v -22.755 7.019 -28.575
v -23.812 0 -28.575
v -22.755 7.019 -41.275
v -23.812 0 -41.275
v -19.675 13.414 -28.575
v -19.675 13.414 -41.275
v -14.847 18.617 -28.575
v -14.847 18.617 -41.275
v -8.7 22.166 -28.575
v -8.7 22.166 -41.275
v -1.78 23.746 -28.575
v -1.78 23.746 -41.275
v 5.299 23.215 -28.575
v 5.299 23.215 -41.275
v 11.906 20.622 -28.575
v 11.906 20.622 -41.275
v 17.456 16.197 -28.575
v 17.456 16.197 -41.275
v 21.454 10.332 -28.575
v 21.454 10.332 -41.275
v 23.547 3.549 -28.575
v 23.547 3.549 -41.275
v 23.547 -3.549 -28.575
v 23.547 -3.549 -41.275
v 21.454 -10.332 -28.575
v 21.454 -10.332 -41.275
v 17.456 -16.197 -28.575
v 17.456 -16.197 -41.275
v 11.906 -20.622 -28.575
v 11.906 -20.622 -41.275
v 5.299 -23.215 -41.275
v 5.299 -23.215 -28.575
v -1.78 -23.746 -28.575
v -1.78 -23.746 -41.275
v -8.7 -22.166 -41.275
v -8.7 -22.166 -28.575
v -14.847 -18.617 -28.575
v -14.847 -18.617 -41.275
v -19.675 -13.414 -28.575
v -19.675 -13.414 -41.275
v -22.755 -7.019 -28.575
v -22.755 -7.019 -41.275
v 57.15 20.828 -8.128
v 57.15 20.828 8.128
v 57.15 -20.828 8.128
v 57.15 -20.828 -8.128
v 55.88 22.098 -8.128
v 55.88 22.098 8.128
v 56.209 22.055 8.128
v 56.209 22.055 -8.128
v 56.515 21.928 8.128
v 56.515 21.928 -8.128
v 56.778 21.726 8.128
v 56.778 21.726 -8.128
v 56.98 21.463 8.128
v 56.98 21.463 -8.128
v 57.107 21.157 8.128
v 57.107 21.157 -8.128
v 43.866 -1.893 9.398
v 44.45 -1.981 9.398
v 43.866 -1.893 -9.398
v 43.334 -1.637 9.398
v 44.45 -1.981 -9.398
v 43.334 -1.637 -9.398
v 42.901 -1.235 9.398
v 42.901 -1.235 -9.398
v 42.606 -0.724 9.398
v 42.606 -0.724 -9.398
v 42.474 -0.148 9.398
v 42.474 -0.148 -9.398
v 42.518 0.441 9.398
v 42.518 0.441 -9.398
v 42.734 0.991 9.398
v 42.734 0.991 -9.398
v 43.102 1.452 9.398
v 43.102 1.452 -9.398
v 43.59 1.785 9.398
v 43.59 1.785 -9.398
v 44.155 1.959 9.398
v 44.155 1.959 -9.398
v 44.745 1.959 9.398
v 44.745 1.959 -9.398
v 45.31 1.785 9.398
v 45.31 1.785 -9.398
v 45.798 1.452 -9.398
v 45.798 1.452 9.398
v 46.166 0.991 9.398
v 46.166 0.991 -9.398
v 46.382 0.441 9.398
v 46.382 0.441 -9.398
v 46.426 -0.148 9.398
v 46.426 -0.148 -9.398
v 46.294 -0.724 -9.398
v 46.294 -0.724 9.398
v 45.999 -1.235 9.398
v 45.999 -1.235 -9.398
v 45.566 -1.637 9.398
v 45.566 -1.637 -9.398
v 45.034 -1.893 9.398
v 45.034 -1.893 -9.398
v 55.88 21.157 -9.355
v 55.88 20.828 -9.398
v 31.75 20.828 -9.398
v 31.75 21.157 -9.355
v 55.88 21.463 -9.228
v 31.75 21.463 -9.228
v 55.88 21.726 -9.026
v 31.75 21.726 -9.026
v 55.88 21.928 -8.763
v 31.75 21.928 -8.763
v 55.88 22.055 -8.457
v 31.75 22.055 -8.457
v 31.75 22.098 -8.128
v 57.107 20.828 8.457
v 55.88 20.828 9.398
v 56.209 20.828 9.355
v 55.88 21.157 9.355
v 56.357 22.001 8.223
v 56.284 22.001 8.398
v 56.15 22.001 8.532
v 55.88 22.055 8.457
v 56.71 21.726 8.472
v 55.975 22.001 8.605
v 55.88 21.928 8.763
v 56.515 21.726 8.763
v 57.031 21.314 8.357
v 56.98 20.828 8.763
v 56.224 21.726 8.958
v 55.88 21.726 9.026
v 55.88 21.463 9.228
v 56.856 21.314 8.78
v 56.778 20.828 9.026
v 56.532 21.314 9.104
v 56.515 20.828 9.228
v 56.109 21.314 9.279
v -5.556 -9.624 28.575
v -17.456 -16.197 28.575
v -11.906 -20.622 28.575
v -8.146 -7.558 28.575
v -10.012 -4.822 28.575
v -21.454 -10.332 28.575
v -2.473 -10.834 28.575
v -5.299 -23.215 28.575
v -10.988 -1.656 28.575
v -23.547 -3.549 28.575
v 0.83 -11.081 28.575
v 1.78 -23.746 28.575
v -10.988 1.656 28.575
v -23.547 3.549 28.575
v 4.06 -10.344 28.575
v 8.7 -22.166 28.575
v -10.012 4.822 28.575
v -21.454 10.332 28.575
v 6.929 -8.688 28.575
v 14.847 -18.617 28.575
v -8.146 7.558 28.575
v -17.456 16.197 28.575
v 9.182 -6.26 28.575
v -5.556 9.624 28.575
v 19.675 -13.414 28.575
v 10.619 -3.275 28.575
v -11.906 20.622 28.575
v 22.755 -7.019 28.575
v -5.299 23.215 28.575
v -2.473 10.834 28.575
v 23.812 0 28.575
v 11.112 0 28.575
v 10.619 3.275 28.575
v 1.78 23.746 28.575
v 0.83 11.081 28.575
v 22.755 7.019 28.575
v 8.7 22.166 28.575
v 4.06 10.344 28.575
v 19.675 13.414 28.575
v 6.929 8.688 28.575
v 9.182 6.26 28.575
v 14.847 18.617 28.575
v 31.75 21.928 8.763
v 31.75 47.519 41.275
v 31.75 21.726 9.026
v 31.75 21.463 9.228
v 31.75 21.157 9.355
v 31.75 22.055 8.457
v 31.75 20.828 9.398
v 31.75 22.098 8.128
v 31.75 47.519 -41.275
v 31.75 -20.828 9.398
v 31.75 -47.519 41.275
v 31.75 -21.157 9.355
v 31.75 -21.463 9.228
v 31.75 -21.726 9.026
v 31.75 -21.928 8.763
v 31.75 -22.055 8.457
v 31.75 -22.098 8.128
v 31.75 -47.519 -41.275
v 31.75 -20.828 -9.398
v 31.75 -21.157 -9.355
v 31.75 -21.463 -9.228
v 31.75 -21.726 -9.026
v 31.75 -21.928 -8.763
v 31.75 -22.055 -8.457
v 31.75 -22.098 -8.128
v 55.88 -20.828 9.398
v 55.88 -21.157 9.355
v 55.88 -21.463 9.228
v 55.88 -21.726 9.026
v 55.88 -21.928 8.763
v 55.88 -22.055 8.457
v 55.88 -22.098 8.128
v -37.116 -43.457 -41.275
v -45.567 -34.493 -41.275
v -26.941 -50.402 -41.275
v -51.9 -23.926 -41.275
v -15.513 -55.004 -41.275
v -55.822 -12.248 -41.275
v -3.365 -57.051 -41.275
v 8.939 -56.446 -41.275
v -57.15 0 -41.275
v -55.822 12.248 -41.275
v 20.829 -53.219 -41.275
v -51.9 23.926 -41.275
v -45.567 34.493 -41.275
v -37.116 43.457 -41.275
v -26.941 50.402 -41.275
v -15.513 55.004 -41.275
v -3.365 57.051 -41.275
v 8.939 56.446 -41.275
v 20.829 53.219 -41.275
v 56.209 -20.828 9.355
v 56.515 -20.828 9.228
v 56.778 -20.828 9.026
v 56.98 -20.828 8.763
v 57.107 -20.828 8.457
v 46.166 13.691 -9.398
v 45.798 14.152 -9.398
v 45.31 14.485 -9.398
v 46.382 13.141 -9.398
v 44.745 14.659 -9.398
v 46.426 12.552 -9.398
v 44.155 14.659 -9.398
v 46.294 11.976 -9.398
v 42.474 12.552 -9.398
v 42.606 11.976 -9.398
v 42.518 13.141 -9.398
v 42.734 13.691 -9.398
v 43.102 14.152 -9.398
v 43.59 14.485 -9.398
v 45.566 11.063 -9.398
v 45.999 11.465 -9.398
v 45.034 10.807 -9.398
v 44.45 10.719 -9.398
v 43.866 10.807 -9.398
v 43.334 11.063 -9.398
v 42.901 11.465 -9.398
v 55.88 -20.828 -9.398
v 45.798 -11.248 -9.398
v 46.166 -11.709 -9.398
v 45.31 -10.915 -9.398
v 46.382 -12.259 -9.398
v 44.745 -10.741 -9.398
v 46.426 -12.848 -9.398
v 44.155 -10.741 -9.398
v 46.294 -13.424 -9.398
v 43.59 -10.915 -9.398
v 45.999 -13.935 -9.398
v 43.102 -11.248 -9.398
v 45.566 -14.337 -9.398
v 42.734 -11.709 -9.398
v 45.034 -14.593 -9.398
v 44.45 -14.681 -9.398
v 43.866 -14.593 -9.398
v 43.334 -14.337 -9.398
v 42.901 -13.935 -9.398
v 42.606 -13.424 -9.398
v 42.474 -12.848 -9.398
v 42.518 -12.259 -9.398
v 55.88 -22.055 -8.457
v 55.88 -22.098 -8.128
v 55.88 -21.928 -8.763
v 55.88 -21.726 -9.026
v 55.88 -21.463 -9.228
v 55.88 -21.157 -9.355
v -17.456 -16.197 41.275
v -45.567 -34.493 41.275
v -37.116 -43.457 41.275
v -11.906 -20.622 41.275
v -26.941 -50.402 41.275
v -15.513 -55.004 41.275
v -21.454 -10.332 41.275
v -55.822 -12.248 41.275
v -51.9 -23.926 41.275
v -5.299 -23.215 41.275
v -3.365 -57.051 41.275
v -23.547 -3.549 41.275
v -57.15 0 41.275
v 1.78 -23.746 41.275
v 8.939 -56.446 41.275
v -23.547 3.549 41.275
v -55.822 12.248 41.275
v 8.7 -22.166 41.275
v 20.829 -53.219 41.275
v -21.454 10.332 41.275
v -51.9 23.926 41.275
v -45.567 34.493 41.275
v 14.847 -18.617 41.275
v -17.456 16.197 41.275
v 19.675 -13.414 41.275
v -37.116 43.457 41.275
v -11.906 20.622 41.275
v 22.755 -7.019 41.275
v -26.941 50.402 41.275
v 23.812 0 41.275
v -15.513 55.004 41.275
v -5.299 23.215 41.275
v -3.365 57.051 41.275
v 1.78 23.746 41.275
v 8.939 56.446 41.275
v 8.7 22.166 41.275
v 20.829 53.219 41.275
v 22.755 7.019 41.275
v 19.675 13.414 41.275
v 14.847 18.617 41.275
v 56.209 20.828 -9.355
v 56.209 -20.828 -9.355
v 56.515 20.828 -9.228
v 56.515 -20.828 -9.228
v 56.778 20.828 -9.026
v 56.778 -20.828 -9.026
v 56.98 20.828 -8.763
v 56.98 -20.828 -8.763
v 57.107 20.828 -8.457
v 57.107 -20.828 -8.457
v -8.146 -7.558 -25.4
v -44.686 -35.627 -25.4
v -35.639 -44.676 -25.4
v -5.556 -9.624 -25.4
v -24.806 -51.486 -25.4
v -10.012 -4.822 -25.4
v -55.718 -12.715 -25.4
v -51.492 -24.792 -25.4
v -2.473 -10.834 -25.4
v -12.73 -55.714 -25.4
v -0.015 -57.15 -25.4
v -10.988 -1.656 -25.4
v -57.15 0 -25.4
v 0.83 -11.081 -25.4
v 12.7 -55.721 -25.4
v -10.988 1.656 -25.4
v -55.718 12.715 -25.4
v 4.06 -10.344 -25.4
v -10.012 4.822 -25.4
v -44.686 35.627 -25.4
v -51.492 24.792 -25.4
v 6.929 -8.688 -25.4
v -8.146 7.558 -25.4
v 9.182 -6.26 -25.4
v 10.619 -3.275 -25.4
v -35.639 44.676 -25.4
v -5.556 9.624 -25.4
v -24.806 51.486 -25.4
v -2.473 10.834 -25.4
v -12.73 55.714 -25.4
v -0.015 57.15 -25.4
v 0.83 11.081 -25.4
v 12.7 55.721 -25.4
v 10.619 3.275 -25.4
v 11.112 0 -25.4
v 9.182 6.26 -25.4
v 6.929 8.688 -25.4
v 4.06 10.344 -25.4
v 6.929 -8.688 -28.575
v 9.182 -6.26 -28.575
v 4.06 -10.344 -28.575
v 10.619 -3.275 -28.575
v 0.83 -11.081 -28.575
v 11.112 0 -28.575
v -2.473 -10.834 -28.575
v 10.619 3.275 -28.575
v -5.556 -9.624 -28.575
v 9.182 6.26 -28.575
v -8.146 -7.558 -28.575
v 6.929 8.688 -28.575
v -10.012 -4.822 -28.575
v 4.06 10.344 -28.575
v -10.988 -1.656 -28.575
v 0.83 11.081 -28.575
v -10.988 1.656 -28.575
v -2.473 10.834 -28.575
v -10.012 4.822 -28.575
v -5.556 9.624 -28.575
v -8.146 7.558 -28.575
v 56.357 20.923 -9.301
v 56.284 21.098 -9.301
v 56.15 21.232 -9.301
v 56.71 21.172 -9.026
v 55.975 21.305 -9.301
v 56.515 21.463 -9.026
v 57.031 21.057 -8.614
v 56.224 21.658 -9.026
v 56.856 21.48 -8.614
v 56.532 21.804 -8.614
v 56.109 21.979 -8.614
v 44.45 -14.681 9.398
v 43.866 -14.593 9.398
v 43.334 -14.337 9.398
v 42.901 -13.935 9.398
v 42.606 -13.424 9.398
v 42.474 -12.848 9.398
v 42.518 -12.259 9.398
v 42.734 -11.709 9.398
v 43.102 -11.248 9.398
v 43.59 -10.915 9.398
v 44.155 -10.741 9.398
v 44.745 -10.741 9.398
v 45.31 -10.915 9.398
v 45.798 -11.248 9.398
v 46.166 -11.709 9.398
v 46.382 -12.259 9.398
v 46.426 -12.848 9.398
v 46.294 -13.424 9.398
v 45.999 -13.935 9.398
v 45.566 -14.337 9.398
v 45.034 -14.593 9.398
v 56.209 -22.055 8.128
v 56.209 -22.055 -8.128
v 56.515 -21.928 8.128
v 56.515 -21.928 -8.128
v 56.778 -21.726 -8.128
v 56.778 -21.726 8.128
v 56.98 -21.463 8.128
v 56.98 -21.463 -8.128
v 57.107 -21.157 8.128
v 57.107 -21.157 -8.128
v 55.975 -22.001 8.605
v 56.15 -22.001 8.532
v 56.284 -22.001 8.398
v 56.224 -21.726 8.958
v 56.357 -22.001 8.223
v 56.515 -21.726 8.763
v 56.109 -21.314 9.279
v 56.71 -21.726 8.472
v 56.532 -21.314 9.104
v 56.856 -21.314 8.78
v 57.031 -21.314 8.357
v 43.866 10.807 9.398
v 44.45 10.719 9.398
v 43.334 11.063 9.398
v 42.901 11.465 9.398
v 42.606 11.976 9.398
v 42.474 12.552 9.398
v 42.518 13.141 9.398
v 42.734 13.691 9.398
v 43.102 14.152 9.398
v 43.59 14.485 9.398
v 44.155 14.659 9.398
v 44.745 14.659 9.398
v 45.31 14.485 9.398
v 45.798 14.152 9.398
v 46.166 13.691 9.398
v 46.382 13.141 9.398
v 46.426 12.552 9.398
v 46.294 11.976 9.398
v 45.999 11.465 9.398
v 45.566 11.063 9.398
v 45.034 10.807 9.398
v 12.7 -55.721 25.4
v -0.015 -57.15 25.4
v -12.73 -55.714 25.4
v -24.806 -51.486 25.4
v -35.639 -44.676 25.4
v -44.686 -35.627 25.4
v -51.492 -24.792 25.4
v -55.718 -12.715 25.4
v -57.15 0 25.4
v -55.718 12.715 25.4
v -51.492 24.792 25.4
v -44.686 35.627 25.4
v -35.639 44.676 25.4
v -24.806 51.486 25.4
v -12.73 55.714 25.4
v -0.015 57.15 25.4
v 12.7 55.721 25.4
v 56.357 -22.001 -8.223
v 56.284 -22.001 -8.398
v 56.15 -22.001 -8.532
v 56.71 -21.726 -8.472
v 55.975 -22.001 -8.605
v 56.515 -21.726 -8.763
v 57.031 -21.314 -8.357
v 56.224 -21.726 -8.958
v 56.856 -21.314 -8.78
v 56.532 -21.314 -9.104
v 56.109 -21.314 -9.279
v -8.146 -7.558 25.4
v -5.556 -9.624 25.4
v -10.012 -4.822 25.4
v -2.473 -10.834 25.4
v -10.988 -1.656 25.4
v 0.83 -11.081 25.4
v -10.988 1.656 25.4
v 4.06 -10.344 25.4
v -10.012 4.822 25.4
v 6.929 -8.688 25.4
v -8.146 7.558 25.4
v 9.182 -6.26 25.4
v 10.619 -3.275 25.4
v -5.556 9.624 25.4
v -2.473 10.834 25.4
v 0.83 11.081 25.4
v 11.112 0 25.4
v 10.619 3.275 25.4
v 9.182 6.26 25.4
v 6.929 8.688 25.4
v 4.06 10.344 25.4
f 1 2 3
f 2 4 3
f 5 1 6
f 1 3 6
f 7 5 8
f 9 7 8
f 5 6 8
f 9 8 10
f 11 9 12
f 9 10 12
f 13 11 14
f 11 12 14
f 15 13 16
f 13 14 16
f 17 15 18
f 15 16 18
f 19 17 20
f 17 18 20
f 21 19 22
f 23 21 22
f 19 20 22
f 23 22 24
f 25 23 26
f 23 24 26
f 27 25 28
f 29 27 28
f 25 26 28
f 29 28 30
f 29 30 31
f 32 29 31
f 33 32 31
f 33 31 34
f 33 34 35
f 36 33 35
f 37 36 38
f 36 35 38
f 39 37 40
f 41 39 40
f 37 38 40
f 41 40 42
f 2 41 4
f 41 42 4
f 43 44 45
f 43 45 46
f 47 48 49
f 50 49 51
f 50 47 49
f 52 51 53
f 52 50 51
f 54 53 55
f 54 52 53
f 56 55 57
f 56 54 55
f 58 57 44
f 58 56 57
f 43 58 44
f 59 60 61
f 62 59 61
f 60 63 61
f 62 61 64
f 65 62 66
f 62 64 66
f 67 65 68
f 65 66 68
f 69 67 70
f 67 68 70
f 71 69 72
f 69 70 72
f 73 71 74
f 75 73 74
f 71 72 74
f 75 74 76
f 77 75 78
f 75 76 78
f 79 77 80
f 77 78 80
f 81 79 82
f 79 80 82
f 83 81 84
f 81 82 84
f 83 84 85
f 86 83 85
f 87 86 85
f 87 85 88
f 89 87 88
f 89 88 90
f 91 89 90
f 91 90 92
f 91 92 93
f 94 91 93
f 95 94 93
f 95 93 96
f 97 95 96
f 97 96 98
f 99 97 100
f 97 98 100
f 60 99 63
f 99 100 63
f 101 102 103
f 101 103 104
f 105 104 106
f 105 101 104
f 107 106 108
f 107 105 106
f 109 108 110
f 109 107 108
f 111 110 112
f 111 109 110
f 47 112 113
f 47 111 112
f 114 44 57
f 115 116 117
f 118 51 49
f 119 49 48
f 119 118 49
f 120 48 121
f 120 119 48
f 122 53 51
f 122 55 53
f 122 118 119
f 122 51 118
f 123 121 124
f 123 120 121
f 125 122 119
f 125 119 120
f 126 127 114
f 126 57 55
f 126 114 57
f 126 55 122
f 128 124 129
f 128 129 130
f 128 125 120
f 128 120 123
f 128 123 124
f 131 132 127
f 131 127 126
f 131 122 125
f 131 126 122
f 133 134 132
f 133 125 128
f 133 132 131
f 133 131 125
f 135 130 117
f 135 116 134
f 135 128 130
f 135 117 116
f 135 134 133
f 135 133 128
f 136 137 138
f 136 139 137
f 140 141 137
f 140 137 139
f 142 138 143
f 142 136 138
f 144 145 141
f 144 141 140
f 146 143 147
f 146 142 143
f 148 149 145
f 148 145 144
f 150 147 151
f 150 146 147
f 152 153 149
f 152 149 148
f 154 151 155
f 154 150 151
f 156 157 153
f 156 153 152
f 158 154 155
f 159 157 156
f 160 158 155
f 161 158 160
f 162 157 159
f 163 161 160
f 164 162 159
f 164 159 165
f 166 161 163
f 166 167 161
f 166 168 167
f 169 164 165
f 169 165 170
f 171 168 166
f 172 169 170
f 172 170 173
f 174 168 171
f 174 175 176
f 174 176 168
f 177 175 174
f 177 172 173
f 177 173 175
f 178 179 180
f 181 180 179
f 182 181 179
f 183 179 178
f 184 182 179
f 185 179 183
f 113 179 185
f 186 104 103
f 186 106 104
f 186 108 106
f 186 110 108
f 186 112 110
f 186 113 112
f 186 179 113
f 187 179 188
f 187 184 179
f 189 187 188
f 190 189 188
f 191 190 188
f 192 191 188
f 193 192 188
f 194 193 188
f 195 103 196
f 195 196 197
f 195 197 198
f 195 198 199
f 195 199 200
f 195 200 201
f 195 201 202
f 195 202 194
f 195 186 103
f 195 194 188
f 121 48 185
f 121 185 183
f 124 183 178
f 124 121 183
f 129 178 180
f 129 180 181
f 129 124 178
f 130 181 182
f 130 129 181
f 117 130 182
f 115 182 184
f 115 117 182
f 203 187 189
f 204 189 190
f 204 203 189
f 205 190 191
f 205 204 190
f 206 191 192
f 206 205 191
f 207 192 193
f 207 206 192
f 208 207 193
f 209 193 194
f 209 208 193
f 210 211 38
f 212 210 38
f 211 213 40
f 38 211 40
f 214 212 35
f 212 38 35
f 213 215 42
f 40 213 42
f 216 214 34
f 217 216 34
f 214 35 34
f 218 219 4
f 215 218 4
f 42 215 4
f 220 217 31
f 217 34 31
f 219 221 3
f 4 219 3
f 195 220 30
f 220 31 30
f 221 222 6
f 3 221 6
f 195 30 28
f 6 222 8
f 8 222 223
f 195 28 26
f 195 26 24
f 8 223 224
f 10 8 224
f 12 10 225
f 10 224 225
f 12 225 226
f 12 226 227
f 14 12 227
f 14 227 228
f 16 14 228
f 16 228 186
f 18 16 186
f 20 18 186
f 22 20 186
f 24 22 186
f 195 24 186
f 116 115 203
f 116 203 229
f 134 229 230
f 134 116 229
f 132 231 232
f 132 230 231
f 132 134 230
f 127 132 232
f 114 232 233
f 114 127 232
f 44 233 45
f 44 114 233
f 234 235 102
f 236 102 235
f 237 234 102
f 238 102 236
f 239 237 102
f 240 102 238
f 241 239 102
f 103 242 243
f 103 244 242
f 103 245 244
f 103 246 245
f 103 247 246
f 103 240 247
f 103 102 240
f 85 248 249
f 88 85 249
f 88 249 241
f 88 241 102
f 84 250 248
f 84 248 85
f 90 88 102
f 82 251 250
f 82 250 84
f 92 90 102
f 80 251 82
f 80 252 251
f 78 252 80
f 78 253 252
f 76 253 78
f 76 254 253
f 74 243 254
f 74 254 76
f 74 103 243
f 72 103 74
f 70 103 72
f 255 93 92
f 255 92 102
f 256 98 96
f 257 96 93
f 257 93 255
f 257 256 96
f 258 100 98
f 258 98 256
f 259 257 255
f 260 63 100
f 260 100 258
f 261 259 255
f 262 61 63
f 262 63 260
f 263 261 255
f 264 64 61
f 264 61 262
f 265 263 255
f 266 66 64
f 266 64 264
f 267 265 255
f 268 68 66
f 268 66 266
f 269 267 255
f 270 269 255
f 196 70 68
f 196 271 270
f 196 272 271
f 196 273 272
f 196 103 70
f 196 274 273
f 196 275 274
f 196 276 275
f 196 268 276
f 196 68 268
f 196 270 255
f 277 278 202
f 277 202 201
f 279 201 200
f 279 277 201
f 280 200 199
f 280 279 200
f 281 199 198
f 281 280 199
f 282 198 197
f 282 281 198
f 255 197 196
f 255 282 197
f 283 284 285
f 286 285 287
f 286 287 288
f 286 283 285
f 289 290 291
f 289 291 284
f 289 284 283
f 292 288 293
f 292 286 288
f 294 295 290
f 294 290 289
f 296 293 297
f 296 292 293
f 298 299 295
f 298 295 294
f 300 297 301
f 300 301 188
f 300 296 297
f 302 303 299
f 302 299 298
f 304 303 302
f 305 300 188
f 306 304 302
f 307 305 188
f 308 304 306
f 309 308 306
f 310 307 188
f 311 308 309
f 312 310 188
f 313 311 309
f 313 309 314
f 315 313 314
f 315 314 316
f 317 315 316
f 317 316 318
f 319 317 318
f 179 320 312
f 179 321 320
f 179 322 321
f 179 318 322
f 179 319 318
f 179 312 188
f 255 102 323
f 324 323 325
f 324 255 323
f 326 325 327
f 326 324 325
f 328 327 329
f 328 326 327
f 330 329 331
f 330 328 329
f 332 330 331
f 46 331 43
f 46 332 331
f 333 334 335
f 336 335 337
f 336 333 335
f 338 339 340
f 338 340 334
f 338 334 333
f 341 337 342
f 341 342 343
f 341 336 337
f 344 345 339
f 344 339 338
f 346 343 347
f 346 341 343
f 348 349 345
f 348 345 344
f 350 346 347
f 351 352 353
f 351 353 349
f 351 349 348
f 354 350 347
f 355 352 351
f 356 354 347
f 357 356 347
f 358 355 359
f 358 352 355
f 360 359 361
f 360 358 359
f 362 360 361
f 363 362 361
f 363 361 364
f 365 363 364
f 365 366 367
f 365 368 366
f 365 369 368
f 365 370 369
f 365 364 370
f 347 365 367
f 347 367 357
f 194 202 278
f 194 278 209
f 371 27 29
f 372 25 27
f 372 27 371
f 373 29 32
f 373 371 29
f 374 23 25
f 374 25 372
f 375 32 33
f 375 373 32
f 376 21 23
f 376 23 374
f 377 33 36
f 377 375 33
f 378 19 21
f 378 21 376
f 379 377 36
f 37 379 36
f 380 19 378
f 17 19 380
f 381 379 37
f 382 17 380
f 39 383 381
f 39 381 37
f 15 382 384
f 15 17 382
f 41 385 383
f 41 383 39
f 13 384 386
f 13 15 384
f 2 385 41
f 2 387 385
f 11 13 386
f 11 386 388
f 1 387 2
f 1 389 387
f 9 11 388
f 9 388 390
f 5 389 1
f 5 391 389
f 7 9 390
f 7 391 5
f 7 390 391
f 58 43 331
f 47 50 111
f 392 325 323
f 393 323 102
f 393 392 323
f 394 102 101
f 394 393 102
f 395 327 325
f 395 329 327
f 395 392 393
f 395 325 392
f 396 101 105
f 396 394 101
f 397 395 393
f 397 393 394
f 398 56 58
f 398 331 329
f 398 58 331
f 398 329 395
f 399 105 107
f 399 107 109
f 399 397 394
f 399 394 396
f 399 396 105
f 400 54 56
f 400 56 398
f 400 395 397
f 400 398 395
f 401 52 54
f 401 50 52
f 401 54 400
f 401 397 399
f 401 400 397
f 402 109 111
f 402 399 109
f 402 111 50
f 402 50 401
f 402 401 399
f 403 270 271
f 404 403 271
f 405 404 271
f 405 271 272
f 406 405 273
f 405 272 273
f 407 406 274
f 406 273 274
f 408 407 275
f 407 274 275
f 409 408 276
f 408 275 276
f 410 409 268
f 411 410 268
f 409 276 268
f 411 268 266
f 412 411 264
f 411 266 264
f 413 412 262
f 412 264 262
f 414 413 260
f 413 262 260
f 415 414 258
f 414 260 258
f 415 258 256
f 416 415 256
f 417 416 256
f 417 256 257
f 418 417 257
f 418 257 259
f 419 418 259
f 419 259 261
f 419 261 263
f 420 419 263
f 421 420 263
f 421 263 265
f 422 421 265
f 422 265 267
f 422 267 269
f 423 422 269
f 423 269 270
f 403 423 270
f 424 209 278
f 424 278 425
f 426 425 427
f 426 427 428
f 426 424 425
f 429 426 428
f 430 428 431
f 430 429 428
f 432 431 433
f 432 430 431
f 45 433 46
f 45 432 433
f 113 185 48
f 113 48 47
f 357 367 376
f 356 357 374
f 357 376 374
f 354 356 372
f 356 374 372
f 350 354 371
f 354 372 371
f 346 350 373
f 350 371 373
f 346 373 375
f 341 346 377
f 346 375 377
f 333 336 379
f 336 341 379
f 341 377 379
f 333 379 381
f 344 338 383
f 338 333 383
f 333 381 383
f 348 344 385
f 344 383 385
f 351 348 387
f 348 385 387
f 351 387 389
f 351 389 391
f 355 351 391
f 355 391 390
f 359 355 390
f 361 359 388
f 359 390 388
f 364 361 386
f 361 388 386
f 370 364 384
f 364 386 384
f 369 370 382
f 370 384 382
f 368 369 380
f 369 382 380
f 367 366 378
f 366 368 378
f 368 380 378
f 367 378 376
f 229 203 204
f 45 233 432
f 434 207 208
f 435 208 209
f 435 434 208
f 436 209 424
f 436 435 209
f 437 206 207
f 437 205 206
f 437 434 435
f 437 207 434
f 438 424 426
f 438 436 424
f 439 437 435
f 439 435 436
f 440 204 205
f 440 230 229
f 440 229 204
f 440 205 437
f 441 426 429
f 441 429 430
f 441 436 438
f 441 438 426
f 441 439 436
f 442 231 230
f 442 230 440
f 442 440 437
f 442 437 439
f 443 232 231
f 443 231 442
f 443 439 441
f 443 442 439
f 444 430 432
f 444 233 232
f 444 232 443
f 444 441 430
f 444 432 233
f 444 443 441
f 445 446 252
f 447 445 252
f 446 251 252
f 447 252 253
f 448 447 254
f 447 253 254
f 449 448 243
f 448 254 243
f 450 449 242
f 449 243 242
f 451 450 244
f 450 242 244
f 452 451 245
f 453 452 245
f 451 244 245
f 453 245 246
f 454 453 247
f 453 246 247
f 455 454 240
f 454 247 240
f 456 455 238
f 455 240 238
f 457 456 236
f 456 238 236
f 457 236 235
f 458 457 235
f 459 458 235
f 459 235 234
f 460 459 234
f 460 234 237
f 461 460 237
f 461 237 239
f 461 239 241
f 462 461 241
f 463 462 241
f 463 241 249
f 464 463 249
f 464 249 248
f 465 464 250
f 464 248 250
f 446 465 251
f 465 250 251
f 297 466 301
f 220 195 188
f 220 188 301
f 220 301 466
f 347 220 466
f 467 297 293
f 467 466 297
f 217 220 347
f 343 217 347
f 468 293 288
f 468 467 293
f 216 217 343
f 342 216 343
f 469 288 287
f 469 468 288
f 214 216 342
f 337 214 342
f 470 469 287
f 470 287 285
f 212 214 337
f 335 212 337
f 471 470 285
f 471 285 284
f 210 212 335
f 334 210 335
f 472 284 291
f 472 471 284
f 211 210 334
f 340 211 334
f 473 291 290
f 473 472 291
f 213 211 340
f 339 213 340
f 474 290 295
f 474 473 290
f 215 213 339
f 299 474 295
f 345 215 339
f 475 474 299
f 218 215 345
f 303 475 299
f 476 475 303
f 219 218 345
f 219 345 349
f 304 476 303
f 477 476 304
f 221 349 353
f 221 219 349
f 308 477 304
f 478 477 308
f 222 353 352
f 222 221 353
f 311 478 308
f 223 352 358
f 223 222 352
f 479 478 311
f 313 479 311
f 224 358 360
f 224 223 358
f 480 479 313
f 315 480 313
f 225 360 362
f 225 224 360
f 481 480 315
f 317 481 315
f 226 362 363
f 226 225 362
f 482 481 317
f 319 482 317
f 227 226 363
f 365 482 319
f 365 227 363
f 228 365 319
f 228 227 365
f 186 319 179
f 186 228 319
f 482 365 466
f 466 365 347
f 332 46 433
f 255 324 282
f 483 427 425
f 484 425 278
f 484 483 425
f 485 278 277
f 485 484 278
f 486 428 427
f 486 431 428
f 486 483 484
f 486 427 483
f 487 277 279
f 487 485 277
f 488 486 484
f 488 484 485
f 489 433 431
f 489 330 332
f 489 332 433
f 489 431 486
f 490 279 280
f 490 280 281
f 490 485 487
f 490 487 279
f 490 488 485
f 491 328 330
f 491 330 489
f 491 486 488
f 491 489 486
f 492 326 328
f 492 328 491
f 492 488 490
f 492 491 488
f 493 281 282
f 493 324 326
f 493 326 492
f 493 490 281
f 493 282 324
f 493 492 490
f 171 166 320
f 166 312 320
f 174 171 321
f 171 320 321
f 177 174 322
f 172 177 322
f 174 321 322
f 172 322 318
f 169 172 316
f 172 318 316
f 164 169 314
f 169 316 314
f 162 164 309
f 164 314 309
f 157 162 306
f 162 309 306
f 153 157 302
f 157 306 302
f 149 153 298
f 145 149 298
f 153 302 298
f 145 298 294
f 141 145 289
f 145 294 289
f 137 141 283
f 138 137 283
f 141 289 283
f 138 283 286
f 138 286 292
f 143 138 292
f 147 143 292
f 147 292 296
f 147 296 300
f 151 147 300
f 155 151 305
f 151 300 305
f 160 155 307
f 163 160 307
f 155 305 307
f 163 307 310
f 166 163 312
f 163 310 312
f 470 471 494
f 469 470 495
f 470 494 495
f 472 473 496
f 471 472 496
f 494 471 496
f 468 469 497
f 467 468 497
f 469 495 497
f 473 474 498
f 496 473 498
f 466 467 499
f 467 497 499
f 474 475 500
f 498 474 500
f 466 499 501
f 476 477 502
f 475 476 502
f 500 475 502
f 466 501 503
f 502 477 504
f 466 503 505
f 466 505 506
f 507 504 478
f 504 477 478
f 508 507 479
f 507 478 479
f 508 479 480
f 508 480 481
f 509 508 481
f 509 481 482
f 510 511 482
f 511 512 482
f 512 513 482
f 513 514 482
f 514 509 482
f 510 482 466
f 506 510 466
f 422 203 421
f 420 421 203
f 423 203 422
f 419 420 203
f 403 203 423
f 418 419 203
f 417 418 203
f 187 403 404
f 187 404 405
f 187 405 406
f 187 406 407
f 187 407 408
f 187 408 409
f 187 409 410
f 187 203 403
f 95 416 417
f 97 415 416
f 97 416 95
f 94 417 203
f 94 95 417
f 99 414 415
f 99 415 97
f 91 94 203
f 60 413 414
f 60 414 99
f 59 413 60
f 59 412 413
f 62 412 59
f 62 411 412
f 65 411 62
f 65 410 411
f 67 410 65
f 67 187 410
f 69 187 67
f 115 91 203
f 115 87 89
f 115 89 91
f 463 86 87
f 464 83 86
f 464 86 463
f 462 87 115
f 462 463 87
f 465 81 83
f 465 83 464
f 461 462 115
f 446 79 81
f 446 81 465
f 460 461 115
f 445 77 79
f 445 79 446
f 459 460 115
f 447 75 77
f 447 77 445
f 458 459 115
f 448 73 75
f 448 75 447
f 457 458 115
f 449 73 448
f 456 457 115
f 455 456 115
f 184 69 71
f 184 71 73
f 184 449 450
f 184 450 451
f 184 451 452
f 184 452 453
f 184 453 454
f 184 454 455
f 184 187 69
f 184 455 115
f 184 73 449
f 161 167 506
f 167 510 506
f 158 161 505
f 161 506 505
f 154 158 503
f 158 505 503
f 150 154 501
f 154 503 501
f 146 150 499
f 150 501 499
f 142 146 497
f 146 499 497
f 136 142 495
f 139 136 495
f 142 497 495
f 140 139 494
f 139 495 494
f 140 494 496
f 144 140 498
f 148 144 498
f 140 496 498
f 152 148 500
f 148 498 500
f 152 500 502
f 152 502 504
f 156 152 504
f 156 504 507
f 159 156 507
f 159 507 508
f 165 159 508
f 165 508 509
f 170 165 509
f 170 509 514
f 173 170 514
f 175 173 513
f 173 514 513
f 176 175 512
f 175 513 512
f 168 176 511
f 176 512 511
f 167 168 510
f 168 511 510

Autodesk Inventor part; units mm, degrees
ref_plane "YZ Plane" through (0, 0, 0) normal (1, 0, 0) x (0, 1, 0)
ref_plane "XZ Plane" through (0, 0, 0) normal (0, 1, 0) x (-1, 0, 0)
ref_plane "XY Plane" through (0, 0, 0) normal (0, 0, 1) x (1, 0, 0)
sketch "Sketch1" plane through (0, 0, 0) normal (0, 0, 1) x (1, 0, 0)
  circle A0 centre (0, 0) radius 11.1125
  circle A1 centre (0, 0) radius 57.15 construction
  line L0 (29.571, 44.45) -> (35.921, 44.45) construction
  line L1 (35.921, 44.45) -> (35.921, -44.45) construction
  line L2 (35.921, -44.45) -> (29.571, -44.45) construction
  line L3 (29.571, -44.45) -> (29.571, 44.45) construction
  line L4 (31.75, 47.519) -> (31.75, -47.519)
  arc A2 (31.75, 47.519) -> (31.75, -47.519) centre (0, 0) ccw
  point P0 (29.571, 0)
  point P1 (57.15, 0)
  point P2 (35.921, 0)
  dimension "d0" = 22.225
  dimension "d2" = 114.3
  dimension "d3" = 88.9
  dimension "d4" = 6.35
  dimension "d5" = 35.921
  dimension "d6" = 21.229
  dimension "d7" = 31.75
extrude "Extrusion1" add sketch "Sketch1" along normal mid plane 82.55
sketch "Sketch3" plane through (0, 0, 41.275) normal (0, 0, 1) x (1, 0, 0)
  circle A0 centre (0, 0) radius 11.1125 construction
  arc A1 (31.75, 47.519) -> (31.75, -47.519) centre (0, 0) ccw construction
  line L0 (31.75, 47.519) -> (31.75, -47.519) construction
  circle A2 centre (0, 0) radius 11.1125 construction
  circle A3 centre (0, 0) radius 23.8125
  dimension "d10" = 47.625
extrude "Extrusion2" cut sketch "Sketch3" against normal blind 12.7
sketch "Sketch4" plane through (0, 0, -41.275) normal (0, 0, -1) x (-1, 0, 0)
  circle A0 centre (0, 0) radius 23.8125
  dimension "d13" = 47.625
extrude "Extrusion3" cut sketch "Sketch4" against normal blind 12.7
sketch "Sketch7" plane through (31.75, -47.519, 41.275) normal (1, 0, 0) x (0, 0, -1)
  line L0 (28.575, 22.119) -> (53.975, 22.119) construction
  line L1 (53.975, 22.119) -> (53.975, 72.919) construction
  line L2 (53.975, 72.919) -> (28.575, 72.919) construction
  line L3 (28.575, 72.919) -> (28.575, 22.119) construction
  line L4 (28.575, 22.119) -> (53.975, 72.919) construction
  line L5 (53.975, 22.119) -> (28.575, 72.919) construction
  line L6 (31.75, 25.294) -> (50.8, 25.294) construction
  line L7 (50.8, 25.294) -> (50.8, 69.744) construction
  line L8 (50.8, 69.744) -> (31.75, 69.744) construction
  line L9 (31.75, 69.744) -> (31.75, 25.294) construction
  line L10 (31.75, 25.294) -> (50.8, 69.744) construction
  line L11 (50.8, 25.294) -> (31.75, 69.744) construction
  line L12 (50.673, 25.421) -> (31.877, 25.421)
  line L13 (31.877, 25.421) -> (31.877, 69.617)
  line L14 (31.877, 69.617) -> (50.673, 69.617)
  line L15 (50.673, 69.617) -> (50.673, 25.421)
  line L16 (50.673, 25.421) -> (31.877, 69.617) construction
  line L17 (31.877, 25.421) -> (50.673, 69.617) construction
  point P0 (41.275, 47.519)
  dimension "d34" = 25.4
  dimension "d35" = 50.8
  dimension "d36" = 3.175
  dimension "d37" = 3.175
  dimension "d38" = 0.127
  dimension "d39" = 0.127
extrude "Extrusion5" add sketch "Sketch7" along normal blind 25.4
sketch "Sketch8" plane through (0, 0, 0) normal (0, 0, 1) x (1, 0, 0)
  circle A0 centre (0, 0) radius 11.1125 projected
  arc A1 (31.75, 47.519) -> (31.75, -47.519) centre (0, 0) ccw projected
  line L0 (31.75, 47.519) -> (31.75, 22.098) projected
  line L1 (31.75, 22.098) -> (57.15, 22.098) projected
  line L2 (57.15, 22.098) -> (57.15, -22.098) projected
  line L3 (57.15, -22.098) -> (31.75, -22.098) projected
  line L4 (31.75, -22.098) -> (31.75, -47.519) projected
  arc A2 (31.75, 47.519) -> (31.75, -47.519) centre (0, 0) ccw projected
  line L5 (12.7, 55.721) -> (12.7, -55.721)
  dimension "d42" = 12.7
extrude "Extrusion6" cut sketch "Sketch8" along normal mid plane 50.8 contours L5 A1
sketch "Sketch9" plane through (31.75, -22.098, 9.398) normal (0, 0, 1) x (1, 0, 0)
  line L0 (25.4, 44.196) -> (25.4, 0) projected
  point P0 (-31.75, 22.098)
  point P1 (12.7, 34.798)
  point P2 (12.7, 22.098)
  point P3 (12.7, 9.398)
  point P4 (25.4, 22.098)
  dimension "d45" = 12.7
  dimension "d46" = 12.7
  dimension "d47" = 12.7
hole "Hole2" at (44.45, 12.7, 9.398) at (44.45, 0, 9.398) at (44.45, -12.7, 9.398) direction (0, 0, -1) diameter 3.9624 end through all thread size "10-32 UNF" class "2B" standard "ANSI Unified Screw Threads"
fillet "Fillet1" radius 1.27 8 edges at (57.15, 0, 9.398) (57.15, 22.098, 0) (57.15, 0, -9.398) (57.15, -22.098, 0) (44.45, -22.098, 9.398) (44.45, 22.098, 9.398) (44.45, 22.098, -9.398) (44.45, -22.098, -9.398)
equation "\"d13\" = d10"
equation "\"d14\" = d11"
equation "\"d37\" = d36"
equation "\"d39\" = d38"
equation "\"d11\" = 12.7"
properties part number "EL2-A-008" material "Aluminum 6061"
